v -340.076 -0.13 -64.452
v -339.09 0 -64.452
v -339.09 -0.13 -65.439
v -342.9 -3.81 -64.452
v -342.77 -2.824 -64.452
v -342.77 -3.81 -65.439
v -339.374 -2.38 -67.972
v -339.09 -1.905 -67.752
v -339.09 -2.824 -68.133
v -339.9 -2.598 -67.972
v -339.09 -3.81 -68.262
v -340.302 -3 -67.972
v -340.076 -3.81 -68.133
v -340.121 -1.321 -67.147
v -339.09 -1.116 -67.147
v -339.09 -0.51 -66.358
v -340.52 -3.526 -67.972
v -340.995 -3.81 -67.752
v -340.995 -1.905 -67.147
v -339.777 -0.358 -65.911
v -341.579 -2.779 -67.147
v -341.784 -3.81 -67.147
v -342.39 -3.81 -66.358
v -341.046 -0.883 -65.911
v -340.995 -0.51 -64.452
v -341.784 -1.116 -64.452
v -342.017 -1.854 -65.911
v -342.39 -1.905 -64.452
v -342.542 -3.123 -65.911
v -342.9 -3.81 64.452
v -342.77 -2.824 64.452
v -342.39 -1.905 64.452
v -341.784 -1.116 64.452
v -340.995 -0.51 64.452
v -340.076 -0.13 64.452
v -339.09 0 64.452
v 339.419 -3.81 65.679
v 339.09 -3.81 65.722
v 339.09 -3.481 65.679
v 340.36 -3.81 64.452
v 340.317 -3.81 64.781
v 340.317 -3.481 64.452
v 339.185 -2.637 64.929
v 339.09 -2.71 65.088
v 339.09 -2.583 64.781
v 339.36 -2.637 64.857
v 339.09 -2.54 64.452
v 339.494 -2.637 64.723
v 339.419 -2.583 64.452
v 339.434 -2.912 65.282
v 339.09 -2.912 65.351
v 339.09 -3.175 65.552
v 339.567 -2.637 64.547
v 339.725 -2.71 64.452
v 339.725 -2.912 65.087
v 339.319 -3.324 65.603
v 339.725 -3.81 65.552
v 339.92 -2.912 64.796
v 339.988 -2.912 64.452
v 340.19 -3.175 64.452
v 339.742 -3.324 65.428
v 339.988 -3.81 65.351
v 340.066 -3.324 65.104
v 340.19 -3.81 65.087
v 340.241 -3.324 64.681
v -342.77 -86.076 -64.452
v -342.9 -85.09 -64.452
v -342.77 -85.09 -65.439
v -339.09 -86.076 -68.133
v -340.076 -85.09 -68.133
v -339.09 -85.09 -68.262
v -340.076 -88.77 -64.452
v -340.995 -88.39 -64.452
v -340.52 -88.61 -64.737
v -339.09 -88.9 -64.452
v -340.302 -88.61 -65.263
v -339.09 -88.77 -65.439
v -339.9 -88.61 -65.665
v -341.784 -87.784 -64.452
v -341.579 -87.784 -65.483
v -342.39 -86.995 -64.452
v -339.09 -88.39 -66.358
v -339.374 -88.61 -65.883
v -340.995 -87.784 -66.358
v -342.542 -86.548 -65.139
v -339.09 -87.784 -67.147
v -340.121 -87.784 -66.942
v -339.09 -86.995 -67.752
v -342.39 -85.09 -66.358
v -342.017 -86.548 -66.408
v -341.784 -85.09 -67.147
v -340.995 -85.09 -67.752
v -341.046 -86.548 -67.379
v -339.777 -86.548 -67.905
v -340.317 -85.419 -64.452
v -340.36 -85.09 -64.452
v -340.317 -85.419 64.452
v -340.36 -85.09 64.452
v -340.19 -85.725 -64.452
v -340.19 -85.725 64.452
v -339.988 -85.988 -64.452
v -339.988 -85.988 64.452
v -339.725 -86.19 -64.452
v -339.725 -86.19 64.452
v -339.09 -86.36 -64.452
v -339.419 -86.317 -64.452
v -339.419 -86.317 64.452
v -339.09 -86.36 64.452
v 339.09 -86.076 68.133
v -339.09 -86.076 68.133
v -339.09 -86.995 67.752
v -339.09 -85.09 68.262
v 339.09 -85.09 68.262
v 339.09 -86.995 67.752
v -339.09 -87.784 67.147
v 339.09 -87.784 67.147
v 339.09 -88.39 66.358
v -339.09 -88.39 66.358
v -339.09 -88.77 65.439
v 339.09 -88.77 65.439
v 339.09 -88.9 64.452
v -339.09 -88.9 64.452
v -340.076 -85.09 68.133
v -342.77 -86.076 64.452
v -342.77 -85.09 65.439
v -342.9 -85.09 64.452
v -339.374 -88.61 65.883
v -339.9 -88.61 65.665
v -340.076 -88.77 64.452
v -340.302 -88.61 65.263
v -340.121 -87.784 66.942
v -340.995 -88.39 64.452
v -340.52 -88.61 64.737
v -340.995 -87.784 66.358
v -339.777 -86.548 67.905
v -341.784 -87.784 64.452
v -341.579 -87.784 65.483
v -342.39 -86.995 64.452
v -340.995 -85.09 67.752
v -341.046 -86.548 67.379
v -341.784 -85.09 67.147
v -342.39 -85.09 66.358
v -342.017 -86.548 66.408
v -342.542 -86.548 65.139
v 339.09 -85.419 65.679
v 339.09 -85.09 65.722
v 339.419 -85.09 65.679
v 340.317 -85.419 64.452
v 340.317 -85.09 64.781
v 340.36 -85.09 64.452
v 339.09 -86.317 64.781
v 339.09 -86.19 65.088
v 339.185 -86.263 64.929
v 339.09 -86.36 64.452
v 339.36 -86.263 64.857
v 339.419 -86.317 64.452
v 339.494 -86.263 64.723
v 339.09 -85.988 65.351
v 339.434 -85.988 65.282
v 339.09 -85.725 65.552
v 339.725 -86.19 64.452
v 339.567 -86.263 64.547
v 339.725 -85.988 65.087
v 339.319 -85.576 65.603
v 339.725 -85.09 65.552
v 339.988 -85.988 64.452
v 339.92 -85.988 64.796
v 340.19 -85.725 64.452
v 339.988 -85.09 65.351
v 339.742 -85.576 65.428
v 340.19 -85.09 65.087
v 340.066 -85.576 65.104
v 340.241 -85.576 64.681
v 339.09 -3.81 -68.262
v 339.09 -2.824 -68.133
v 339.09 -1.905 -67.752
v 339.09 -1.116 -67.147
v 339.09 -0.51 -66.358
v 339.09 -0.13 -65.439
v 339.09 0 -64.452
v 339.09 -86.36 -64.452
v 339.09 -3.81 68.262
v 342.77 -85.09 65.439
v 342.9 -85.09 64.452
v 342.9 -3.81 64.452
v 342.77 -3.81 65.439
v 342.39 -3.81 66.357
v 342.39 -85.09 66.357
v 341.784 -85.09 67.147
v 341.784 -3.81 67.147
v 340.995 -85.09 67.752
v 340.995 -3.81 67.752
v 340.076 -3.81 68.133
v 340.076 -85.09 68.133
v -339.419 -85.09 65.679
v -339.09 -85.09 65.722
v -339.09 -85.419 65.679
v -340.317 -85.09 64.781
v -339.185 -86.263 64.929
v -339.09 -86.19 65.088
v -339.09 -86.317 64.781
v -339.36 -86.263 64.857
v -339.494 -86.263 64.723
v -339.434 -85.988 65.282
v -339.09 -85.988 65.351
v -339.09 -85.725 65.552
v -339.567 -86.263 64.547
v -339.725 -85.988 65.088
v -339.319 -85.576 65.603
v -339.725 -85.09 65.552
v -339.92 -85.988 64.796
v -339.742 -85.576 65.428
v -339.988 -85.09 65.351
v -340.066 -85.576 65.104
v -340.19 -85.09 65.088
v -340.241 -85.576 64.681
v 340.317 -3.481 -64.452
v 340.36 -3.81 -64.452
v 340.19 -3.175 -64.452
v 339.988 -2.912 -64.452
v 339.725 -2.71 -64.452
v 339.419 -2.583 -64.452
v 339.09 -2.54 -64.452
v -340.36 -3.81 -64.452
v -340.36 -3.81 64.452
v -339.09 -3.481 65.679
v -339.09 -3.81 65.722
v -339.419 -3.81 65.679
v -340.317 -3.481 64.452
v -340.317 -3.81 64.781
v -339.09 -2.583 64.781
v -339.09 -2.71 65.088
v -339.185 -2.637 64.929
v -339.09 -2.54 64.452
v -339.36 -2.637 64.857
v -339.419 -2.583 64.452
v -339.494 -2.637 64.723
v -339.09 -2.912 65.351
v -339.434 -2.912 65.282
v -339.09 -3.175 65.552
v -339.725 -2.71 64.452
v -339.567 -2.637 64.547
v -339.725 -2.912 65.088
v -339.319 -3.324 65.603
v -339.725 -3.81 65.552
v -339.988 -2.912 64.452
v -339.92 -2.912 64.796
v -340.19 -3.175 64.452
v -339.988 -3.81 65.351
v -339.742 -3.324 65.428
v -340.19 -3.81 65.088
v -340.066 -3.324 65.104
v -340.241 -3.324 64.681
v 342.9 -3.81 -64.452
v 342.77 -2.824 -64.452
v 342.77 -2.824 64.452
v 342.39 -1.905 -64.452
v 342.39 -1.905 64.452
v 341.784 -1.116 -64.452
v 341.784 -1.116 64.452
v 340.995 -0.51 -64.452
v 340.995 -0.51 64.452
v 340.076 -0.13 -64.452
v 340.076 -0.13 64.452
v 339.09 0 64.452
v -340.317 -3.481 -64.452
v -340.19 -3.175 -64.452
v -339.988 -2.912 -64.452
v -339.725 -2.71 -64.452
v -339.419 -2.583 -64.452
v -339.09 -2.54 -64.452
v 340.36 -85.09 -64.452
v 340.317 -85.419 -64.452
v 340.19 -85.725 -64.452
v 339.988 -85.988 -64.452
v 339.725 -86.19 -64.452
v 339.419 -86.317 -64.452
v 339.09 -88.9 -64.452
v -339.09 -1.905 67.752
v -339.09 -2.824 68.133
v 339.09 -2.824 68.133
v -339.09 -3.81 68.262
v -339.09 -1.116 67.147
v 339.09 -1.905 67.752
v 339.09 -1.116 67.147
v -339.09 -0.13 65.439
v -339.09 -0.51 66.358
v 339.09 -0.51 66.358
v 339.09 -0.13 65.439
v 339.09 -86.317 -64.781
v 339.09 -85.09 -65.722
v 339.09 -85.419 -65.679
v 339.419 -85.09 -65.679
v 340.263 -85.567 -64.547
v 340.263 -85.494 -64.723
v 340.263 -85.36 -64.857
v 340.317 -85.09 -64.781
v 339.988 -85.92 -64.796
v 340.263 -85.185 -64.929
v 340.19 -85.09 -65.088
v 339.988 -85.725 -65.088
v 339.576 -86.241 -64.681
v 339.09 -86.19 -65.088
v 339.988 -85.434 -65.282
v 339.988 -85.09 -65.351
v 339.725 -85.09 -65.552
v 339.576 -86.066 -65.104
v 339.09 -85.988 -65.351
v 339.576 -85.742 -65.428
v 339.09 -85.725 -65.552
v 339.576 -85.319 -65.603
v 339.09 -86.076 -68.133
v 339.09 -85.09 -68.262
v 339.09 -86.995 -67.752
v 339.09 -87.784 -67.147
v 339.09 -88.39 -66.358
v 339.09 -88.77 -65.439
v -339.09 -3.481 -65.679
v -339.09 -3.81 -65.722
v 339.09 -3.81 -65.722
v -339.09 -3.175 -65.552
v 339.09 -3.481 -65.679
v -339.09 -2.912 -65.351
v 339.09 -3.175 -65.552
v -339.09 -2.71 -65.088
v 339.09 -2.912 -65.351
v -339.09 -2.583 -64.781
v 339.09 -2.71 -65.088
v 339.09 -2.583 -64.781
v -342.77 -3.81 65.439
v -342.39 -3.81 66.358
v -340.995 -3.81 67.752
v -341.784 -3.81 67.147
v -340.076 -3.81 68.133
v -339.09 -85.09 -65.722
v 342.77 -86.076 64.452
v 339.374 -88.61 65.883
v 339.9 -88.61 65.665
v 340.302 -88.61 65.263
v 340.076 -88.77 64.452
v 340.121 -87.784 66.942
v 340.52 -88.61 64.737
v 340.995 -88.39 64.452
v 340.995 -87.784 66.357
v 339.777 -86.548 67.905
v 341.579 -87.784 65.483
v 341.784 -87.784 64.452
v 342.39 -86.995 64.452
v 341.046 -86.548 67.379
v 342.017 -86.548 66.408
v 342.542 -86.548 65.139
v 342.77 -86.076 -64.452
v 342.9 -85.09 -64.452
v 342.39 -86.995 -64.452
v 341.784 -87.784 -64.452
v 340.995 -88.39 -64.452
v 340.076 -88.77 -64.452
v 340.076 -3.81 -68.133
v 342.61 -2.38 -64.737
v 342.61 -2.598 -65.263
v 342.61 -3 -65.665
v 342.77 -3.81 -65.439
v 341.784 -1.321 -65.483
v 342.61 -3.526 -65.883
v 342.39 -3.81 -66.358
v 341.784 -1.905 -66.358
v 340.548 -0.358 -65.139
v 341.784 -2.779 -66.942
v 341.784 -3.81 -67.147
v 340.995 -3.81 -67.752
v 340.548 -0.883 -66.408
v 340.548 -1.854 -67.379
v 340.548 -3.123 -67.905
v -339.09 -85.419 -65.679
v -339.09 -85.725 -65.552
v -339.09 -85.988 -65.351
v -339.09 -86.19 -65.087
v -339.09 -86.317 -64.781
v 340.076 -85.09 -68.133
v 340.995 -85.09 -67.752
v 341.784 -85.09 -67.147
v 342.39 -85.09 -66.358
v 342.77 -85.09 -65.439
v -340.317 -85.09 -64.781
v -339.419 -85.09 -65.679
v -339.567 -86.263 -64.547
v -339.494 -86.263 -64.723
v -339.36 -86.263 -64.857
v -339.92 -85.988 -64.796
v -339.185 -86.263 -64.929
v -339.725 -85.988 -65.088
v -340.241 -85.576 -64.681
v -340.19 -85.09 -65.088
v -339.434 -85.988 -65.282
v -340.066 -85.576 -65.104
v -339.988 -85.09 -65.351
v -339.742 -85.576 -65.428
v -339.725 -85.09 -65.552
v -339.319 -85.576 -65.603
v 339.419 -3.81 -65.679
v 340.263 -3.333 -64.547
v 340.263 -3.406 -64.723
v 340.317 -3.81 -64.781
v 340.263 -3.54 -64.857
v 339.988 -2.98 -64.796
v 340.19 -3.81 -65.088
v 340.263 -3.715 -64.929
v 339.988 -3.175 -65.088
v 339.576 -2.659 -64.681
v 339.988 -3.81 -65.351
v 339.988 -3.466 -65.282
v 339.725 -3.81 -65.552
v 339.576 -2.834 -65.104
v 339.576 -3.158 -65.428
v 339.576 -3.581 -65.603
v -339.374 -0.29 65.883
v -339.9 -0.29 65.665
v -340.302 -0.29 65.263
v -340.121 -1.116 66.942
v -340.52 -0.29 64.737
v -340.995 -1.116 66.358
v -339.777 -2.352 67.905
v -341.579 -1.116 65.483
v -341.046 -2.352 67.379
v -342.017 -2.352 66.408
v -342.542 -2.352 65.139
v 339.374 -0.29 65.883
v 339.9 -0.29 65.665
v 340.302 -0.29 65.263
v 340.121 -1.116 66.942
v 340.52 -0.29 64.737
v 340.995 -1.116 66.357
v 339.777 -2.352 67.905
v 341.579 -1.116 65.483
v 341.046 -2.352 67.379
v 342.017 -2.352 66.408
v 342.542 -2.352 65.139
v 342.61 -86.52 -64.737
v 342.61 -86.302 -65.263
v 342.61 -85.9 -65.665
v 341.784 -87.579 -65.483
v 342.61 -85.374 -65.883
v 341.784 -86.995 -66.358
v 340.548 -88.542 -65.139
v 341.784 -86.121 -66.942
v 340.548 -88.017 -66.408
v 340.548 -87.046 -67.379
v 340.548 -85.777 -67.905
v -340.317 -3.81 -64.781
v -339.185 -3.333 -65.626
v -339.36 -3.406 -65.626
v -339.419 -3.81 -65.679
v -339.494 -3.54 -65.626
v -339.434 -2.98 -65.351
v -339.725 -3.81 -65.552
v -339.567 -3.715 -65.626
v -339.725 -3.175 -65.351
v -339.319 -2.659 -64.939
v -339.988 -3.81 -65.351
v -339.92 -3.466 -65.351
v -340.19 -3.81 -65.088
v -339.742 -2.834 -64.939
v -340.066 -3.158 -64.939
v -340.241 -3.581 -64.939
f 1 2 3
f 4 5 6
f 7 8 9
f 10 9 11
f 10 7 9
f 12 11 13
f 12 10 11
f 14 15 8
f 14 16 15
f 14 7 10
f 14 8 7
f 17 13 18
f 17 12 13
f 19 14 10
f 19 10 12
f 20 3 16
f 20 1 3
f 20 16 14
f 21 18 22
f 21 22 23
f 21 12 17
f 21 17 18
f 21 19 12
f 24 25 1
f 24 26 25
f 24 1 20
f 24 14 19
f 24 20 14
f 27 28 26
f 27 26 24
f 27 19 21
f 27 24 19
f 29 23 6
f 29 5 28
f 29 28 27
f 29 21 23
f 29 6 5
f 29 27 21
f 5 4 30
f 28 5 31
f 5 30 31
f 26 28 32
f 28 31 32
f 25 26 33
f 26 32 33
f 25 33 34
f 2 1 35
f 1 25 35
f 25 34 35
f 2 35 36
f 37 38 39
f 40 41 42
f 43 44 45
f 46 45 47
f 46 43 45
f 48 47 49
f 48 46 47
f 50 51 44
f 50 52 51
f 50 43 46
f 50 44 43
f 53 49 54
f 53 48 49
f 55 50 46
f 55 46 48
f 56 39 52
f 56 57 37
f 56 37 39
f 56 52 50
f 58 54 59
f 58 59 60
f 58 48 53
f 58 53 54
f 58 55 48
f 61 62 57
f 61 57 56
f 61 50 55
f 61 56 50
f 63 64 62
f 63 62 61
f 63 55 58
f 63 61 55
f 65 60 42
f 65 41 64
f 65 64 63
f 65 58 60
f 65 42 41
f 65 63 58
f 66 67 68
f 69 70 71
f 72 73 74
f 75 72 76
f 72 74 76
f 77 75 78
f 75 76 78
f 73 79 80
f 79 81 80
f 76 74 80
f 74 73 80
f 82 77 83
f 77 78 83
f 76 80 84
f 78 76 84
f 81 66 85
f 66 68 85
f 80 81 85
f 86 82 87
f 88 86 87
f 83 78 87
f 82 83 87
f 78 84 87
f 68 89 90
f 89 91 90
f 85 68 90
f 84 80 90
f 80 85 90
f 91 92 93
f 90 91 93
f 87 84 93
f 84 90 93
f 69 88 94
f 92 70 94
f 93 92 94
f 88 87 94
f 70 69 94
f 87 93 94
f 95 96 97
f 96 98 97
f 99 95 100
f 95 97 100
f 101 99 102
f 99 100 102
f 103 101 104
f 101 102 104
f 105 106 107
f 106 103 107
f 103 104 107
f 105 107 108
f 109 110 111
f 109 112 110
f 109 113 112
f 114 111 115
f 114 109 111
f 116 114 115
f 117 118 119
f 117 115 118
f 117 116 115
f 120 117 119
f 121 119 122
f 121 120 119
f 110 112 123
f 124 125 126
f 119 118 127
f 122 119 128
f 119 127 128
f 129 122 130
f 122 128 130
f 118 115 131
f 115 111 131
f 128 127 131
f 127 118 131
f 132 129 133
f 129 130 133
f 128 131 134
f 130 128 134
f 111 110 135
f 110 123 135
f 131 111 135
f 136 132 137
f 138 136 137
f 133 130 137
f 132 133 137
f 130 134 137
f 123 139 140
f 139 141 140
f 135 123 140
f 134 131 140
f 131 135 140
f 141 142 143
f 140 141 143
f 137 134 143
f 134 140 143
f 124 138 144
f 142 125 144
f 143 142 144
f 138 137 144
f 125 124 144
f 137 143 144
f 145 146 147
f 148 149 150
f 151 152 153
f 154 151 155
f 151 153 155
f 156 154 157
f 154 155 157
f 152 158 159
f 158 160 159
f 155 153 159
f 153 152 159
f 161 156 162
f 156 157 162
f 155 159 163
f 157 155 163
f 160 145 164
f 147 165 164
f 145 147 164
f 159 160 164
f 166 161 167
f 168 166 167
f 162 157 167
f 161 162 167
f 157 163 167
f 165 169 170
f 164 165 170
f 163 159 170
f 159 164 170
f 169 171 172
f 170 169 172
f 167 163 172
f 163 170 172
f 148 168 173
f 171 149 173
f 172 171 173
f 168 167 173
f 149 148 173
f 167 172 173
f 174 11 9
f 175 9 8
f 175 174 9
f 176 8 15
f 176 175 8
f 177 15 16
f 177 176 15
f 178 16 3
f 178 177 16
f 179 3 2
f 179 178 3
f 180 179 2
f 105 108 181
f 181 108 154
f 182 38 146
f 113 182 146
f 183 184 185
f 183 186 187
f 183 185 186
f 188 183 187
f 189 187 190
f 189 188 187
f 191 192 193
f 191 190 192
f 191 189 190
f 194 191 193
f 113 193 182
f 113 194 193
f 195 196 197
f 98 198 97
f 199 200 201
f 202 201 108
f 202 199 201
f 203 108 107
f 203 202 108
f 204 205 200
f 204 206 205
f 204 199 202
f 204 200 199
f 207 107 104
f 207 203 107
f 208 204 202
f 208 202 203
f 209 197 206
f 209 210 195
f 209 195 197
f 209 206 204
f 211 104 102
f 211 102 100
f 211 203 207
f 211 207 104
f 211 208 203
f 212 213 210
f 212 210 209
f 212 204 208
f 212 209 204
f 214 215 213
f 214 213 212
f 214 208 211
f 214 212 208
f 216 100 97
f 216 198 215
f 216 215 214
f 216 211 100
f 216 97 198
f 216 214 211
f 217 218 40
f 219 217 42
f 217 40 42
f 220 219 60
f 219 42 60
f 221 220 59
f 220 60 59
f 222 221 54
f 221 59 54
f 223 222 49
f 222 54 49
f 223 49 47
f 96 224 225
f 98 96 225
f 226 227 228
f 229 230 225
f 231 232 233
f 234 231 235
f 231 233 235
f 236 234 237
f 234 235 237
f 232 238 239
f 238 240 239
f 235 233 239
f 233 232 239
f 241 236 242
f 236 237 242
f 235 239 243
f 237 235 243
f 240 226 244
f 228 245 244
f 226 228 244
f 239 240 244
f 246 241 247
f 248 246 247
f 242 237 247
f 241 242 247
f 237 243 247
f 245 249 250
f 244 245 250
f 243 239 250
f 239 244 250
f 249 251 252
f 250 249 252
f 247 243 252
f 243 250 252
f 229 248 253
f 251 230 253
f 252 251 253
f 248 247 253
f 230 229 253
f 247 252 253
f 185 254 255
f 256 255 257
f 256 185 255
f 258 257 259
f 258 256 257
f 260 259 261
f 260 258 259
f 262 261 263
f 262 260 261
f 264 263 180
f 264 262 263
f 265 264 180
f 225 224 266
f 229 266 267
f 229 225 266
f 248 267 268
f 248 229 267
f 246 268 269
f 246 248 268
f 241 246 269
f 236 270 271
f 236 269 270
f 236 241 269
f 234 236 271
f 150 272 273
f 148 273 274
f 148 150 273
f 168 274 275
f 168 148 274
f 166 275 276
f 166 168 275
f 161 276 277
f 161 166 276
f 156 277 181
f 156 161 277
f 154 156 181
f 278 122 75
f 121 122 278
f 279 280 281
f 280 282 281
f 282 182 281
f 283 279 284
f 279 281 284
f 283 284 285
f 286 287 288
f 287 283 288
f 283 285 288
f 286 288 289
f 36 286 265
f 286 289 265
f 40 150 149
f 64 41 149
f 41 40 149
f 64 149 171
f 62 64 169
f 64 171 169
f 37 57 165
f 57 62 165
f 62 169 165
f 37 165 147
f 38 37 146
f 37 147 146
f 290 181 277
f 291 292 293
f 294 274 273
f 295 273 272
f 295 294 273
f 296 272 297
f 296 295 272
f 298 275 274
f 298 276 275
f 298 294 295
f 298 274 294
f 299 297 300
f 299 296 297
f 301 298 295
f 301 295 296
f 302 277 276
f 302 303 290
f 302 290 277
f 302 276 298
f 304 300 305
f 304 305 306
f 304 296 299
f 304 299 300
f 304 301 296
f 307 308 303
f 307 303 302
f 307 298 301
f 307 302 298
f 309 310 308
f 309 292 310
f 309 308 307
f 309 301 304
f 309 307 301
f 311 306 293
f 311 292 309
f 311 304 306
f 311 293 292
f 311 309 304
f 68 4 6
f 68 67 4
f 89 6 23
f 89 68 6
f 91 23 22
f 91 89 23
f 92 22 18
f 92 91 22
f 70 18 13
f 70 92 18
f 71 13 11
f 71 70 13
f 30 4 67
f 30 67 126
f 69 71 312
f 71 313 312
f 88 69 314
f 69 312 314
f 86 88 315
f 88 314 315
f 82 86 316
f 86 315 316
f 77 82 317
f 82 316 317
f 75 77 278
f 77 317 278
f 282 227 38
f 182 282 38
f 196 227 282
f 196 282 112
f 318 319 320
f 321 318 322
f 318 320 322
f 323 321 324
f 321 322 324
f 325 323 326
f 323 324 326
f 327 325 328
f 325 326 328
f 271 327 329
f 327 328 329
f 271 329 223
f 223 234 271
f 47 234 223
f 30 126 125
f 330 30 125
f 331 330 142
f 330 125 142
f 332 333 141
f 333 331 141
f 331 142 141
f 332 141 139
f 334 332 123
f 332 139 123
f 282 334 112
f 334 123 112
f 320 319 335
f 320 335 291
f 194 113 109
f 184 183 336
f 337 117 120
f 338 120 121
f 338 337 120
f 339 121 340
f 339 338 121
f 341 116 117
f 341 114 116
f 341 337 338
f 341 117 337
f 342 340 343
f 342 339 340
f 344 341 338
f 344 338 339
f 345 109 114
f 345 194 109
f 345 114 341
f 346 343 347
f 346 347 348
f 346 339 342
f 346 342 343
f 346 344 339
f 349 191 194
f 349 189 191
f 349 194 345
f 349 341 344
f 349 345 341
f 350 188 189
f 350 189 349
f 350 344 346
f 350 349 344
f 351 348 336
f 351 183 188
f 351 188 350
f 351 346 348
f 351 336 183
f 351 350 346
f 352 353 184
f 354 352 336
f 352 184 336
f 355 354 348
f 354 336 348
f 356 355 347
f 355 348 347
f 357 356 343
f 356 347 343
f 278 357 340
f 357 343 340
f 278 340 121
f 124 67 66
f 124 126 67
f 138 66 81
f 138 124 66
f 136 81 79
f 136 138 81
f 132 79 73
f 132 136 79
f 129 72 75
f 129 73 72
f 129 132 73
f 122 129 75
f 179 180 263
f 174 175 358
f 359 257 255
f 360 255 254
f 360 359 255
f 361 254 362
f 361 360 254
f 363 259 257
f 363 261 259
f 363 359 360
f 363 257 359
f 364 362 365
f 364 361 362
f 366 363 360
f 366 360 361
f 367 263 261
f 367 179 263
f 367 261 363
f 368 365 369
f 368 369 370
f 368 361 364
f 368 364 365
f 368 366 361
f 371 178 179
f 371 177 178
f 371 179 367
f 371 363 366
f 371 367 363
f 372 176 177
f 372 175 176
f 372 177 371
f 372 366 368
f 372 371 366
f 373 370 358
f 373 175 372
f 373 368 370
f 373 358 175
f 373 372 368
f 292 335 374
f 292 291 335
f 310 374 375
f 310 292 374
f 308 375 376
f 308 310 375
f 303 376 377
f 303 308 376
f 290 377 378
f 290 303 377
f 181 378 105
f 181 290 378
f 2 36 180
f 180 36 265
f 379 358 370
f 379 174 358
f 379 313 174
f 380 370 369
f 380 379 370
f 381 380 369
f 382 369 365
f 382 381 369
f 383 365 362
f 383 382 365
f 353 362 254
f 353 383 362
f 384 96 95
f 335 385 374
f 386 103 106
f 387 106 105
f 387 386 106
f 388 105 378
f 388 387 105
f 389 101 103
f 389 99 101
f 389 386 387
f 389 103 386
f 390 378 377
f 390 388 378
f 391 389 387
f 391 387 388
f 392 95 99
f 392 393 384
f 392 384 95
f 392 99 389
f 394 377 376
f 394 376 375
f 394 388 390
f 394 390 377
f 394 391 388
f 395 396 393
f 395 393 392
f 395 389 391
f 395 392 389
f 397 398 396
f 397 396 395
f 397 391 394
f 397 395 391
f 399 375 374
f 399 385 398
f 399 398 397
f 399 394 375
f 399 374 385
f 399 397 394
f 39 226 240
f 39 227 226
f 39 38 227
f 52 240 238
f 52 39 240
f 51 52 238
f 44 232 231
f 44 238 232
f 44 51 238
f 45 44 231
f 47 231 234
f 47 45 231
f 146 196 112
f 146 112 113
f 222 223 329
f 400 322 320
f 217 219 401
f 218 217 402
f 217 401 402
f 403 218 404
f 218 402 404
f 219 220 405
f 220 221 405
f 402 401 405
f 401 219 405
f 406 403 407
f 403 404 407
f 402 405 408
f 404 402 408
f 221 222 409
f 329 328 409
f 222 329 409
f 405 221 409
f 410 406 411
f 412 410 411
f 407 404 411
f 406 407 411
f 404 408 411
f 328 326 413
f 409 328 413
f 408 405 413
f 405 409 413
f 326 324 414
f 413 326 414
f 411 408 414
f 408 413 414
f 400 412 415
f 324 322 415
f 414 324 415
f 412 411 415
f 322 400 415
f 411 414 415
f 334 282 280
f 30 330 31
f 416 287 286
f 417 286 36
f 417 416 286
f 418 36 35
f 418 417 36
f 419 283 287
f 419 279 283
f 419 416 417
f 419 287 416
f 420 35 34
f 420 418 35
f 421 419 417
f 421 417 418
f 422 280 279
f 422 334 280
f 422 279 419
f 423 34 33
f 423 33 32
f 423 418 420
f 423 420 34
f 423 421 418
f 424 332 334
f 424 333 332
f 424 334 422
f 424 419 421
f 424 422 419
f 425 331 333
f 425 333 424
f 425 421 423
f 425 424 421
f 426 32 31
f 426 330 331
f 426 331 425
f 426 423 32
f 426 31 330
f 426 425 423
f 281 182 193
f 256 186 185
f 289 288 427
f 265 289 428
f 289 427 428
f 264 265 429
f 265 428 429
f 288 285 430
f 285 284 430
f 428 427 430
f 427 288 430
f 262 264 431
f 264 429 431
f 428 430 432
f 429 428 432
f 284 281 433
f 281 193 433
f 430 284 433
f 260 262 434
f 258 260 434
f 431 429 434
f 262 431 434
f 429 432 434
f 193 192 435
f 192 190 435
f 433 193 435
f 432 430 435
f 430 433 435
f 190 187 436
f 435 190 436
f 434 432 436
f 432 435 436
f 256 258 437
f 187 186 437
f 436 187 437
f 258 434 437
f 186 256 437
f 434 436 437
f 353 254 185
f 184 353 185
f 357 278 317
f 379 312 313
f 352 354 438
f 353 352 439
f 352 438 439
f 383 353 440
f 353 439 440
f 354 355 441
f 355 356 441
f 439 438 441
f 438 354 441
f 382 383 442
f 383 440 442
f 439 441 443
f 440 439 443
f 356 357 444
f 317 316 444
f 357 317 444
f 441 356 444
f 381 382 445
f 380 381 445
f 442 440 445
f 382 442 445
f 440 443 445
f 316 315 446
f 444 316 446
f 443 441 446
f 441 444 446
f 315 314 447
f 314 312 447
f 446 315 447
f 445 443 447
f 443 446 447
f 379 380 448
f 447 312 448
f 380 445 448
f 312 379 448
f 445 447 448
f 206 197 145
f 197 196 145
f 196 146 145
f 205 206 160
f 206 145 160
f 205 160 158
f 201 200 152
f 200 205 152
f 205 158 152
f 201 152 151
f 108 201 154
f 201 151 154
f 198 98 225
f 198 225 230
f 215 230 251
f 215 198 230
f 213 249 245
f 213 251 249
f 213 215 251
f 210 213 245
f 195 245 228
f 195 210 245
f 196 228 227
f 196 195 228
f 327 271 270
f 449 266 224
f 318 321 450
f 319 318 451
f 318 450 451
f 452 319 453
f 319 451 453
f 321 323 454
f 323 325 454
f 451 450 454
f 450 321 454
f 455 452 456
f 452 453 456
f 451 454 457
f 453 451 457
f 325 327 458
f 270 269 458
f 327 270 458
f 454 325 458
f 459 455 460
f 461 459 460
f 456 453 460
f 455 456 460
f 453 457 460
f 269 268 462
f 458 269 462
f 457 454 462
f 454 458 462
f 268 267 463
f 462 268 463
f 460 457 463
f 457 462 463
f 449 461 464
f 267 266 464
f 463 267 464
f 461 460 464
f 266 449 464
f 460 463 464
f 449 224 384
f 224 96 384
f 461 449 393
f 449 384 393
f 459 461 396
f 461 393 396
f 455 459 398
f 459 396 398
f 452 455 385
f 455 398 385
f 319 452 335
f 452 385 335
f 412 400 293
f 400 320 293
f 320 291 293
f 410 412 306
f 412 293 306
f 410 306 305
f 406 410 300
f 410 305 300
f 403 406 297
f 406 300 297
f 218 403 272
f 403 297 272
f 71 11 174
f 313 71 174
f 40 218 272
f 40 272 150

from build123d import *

# Parameters (mm, degrees)
F0_W     = 685.8
F0_H     = 136.525
F1_DEPTH = 88.9
F2_R     = 3.81
F3_T     = -2.54


# Not quite as in the source:
# - a shell that OpenCascade refuses in one call is made with other operations: the cavity is built on its own and cut out


with BuildPart() as f1:
    # F0 (on Front) → F1 (new body)
    with BuildSketch(Plane.XZ):
        Rectangle(F0_W, F0_H)
    extrude(amount=F1_DEPTH)

    # F2
    f2_edges = [f1.edges().sort_by_distance(p)[0] for p in [
        (-342.9, -44.45, 68.2625),
        (342.9, -44.45, 68.2625),
        (0, 0, 68.2625),
        (0, -88.9, 68.2625),
        (-342.9, 0, 0),
        (0, 0, -68.2625),
        (342.9, 0, 0),
        (-342.9, -44.45, -68.2625),
        (-342.9, -88.9, 0),
        (0, -88.9, -68.2625),
        (342.9, -88.9, 0),
        (342.9, -44.45, -68.2625),
    ]]
    fillet(f2_edges, radius=F2_R)

    # F3: a shell. OpenCascade refuses it in one call, so the cavity is built on its own and cut out:
    # the body offset inwards by the wall thickness, plus a prism from it out through each open face.
    f3_core = offset(f1.part, amount=F3_T, mode=Mode.PRIVATE)
    f3_exits = [f3_core.faces().sort_by_distance(p)[0] for p in [
        (0, -44.45, 65.7225),
    ]]
    add(f3_core, mode=Mode.SUBTRACT)
    extrude(f3_exits, amount=-F3_T, mode=Mode.SUBTRACT)


solid = f1.part
